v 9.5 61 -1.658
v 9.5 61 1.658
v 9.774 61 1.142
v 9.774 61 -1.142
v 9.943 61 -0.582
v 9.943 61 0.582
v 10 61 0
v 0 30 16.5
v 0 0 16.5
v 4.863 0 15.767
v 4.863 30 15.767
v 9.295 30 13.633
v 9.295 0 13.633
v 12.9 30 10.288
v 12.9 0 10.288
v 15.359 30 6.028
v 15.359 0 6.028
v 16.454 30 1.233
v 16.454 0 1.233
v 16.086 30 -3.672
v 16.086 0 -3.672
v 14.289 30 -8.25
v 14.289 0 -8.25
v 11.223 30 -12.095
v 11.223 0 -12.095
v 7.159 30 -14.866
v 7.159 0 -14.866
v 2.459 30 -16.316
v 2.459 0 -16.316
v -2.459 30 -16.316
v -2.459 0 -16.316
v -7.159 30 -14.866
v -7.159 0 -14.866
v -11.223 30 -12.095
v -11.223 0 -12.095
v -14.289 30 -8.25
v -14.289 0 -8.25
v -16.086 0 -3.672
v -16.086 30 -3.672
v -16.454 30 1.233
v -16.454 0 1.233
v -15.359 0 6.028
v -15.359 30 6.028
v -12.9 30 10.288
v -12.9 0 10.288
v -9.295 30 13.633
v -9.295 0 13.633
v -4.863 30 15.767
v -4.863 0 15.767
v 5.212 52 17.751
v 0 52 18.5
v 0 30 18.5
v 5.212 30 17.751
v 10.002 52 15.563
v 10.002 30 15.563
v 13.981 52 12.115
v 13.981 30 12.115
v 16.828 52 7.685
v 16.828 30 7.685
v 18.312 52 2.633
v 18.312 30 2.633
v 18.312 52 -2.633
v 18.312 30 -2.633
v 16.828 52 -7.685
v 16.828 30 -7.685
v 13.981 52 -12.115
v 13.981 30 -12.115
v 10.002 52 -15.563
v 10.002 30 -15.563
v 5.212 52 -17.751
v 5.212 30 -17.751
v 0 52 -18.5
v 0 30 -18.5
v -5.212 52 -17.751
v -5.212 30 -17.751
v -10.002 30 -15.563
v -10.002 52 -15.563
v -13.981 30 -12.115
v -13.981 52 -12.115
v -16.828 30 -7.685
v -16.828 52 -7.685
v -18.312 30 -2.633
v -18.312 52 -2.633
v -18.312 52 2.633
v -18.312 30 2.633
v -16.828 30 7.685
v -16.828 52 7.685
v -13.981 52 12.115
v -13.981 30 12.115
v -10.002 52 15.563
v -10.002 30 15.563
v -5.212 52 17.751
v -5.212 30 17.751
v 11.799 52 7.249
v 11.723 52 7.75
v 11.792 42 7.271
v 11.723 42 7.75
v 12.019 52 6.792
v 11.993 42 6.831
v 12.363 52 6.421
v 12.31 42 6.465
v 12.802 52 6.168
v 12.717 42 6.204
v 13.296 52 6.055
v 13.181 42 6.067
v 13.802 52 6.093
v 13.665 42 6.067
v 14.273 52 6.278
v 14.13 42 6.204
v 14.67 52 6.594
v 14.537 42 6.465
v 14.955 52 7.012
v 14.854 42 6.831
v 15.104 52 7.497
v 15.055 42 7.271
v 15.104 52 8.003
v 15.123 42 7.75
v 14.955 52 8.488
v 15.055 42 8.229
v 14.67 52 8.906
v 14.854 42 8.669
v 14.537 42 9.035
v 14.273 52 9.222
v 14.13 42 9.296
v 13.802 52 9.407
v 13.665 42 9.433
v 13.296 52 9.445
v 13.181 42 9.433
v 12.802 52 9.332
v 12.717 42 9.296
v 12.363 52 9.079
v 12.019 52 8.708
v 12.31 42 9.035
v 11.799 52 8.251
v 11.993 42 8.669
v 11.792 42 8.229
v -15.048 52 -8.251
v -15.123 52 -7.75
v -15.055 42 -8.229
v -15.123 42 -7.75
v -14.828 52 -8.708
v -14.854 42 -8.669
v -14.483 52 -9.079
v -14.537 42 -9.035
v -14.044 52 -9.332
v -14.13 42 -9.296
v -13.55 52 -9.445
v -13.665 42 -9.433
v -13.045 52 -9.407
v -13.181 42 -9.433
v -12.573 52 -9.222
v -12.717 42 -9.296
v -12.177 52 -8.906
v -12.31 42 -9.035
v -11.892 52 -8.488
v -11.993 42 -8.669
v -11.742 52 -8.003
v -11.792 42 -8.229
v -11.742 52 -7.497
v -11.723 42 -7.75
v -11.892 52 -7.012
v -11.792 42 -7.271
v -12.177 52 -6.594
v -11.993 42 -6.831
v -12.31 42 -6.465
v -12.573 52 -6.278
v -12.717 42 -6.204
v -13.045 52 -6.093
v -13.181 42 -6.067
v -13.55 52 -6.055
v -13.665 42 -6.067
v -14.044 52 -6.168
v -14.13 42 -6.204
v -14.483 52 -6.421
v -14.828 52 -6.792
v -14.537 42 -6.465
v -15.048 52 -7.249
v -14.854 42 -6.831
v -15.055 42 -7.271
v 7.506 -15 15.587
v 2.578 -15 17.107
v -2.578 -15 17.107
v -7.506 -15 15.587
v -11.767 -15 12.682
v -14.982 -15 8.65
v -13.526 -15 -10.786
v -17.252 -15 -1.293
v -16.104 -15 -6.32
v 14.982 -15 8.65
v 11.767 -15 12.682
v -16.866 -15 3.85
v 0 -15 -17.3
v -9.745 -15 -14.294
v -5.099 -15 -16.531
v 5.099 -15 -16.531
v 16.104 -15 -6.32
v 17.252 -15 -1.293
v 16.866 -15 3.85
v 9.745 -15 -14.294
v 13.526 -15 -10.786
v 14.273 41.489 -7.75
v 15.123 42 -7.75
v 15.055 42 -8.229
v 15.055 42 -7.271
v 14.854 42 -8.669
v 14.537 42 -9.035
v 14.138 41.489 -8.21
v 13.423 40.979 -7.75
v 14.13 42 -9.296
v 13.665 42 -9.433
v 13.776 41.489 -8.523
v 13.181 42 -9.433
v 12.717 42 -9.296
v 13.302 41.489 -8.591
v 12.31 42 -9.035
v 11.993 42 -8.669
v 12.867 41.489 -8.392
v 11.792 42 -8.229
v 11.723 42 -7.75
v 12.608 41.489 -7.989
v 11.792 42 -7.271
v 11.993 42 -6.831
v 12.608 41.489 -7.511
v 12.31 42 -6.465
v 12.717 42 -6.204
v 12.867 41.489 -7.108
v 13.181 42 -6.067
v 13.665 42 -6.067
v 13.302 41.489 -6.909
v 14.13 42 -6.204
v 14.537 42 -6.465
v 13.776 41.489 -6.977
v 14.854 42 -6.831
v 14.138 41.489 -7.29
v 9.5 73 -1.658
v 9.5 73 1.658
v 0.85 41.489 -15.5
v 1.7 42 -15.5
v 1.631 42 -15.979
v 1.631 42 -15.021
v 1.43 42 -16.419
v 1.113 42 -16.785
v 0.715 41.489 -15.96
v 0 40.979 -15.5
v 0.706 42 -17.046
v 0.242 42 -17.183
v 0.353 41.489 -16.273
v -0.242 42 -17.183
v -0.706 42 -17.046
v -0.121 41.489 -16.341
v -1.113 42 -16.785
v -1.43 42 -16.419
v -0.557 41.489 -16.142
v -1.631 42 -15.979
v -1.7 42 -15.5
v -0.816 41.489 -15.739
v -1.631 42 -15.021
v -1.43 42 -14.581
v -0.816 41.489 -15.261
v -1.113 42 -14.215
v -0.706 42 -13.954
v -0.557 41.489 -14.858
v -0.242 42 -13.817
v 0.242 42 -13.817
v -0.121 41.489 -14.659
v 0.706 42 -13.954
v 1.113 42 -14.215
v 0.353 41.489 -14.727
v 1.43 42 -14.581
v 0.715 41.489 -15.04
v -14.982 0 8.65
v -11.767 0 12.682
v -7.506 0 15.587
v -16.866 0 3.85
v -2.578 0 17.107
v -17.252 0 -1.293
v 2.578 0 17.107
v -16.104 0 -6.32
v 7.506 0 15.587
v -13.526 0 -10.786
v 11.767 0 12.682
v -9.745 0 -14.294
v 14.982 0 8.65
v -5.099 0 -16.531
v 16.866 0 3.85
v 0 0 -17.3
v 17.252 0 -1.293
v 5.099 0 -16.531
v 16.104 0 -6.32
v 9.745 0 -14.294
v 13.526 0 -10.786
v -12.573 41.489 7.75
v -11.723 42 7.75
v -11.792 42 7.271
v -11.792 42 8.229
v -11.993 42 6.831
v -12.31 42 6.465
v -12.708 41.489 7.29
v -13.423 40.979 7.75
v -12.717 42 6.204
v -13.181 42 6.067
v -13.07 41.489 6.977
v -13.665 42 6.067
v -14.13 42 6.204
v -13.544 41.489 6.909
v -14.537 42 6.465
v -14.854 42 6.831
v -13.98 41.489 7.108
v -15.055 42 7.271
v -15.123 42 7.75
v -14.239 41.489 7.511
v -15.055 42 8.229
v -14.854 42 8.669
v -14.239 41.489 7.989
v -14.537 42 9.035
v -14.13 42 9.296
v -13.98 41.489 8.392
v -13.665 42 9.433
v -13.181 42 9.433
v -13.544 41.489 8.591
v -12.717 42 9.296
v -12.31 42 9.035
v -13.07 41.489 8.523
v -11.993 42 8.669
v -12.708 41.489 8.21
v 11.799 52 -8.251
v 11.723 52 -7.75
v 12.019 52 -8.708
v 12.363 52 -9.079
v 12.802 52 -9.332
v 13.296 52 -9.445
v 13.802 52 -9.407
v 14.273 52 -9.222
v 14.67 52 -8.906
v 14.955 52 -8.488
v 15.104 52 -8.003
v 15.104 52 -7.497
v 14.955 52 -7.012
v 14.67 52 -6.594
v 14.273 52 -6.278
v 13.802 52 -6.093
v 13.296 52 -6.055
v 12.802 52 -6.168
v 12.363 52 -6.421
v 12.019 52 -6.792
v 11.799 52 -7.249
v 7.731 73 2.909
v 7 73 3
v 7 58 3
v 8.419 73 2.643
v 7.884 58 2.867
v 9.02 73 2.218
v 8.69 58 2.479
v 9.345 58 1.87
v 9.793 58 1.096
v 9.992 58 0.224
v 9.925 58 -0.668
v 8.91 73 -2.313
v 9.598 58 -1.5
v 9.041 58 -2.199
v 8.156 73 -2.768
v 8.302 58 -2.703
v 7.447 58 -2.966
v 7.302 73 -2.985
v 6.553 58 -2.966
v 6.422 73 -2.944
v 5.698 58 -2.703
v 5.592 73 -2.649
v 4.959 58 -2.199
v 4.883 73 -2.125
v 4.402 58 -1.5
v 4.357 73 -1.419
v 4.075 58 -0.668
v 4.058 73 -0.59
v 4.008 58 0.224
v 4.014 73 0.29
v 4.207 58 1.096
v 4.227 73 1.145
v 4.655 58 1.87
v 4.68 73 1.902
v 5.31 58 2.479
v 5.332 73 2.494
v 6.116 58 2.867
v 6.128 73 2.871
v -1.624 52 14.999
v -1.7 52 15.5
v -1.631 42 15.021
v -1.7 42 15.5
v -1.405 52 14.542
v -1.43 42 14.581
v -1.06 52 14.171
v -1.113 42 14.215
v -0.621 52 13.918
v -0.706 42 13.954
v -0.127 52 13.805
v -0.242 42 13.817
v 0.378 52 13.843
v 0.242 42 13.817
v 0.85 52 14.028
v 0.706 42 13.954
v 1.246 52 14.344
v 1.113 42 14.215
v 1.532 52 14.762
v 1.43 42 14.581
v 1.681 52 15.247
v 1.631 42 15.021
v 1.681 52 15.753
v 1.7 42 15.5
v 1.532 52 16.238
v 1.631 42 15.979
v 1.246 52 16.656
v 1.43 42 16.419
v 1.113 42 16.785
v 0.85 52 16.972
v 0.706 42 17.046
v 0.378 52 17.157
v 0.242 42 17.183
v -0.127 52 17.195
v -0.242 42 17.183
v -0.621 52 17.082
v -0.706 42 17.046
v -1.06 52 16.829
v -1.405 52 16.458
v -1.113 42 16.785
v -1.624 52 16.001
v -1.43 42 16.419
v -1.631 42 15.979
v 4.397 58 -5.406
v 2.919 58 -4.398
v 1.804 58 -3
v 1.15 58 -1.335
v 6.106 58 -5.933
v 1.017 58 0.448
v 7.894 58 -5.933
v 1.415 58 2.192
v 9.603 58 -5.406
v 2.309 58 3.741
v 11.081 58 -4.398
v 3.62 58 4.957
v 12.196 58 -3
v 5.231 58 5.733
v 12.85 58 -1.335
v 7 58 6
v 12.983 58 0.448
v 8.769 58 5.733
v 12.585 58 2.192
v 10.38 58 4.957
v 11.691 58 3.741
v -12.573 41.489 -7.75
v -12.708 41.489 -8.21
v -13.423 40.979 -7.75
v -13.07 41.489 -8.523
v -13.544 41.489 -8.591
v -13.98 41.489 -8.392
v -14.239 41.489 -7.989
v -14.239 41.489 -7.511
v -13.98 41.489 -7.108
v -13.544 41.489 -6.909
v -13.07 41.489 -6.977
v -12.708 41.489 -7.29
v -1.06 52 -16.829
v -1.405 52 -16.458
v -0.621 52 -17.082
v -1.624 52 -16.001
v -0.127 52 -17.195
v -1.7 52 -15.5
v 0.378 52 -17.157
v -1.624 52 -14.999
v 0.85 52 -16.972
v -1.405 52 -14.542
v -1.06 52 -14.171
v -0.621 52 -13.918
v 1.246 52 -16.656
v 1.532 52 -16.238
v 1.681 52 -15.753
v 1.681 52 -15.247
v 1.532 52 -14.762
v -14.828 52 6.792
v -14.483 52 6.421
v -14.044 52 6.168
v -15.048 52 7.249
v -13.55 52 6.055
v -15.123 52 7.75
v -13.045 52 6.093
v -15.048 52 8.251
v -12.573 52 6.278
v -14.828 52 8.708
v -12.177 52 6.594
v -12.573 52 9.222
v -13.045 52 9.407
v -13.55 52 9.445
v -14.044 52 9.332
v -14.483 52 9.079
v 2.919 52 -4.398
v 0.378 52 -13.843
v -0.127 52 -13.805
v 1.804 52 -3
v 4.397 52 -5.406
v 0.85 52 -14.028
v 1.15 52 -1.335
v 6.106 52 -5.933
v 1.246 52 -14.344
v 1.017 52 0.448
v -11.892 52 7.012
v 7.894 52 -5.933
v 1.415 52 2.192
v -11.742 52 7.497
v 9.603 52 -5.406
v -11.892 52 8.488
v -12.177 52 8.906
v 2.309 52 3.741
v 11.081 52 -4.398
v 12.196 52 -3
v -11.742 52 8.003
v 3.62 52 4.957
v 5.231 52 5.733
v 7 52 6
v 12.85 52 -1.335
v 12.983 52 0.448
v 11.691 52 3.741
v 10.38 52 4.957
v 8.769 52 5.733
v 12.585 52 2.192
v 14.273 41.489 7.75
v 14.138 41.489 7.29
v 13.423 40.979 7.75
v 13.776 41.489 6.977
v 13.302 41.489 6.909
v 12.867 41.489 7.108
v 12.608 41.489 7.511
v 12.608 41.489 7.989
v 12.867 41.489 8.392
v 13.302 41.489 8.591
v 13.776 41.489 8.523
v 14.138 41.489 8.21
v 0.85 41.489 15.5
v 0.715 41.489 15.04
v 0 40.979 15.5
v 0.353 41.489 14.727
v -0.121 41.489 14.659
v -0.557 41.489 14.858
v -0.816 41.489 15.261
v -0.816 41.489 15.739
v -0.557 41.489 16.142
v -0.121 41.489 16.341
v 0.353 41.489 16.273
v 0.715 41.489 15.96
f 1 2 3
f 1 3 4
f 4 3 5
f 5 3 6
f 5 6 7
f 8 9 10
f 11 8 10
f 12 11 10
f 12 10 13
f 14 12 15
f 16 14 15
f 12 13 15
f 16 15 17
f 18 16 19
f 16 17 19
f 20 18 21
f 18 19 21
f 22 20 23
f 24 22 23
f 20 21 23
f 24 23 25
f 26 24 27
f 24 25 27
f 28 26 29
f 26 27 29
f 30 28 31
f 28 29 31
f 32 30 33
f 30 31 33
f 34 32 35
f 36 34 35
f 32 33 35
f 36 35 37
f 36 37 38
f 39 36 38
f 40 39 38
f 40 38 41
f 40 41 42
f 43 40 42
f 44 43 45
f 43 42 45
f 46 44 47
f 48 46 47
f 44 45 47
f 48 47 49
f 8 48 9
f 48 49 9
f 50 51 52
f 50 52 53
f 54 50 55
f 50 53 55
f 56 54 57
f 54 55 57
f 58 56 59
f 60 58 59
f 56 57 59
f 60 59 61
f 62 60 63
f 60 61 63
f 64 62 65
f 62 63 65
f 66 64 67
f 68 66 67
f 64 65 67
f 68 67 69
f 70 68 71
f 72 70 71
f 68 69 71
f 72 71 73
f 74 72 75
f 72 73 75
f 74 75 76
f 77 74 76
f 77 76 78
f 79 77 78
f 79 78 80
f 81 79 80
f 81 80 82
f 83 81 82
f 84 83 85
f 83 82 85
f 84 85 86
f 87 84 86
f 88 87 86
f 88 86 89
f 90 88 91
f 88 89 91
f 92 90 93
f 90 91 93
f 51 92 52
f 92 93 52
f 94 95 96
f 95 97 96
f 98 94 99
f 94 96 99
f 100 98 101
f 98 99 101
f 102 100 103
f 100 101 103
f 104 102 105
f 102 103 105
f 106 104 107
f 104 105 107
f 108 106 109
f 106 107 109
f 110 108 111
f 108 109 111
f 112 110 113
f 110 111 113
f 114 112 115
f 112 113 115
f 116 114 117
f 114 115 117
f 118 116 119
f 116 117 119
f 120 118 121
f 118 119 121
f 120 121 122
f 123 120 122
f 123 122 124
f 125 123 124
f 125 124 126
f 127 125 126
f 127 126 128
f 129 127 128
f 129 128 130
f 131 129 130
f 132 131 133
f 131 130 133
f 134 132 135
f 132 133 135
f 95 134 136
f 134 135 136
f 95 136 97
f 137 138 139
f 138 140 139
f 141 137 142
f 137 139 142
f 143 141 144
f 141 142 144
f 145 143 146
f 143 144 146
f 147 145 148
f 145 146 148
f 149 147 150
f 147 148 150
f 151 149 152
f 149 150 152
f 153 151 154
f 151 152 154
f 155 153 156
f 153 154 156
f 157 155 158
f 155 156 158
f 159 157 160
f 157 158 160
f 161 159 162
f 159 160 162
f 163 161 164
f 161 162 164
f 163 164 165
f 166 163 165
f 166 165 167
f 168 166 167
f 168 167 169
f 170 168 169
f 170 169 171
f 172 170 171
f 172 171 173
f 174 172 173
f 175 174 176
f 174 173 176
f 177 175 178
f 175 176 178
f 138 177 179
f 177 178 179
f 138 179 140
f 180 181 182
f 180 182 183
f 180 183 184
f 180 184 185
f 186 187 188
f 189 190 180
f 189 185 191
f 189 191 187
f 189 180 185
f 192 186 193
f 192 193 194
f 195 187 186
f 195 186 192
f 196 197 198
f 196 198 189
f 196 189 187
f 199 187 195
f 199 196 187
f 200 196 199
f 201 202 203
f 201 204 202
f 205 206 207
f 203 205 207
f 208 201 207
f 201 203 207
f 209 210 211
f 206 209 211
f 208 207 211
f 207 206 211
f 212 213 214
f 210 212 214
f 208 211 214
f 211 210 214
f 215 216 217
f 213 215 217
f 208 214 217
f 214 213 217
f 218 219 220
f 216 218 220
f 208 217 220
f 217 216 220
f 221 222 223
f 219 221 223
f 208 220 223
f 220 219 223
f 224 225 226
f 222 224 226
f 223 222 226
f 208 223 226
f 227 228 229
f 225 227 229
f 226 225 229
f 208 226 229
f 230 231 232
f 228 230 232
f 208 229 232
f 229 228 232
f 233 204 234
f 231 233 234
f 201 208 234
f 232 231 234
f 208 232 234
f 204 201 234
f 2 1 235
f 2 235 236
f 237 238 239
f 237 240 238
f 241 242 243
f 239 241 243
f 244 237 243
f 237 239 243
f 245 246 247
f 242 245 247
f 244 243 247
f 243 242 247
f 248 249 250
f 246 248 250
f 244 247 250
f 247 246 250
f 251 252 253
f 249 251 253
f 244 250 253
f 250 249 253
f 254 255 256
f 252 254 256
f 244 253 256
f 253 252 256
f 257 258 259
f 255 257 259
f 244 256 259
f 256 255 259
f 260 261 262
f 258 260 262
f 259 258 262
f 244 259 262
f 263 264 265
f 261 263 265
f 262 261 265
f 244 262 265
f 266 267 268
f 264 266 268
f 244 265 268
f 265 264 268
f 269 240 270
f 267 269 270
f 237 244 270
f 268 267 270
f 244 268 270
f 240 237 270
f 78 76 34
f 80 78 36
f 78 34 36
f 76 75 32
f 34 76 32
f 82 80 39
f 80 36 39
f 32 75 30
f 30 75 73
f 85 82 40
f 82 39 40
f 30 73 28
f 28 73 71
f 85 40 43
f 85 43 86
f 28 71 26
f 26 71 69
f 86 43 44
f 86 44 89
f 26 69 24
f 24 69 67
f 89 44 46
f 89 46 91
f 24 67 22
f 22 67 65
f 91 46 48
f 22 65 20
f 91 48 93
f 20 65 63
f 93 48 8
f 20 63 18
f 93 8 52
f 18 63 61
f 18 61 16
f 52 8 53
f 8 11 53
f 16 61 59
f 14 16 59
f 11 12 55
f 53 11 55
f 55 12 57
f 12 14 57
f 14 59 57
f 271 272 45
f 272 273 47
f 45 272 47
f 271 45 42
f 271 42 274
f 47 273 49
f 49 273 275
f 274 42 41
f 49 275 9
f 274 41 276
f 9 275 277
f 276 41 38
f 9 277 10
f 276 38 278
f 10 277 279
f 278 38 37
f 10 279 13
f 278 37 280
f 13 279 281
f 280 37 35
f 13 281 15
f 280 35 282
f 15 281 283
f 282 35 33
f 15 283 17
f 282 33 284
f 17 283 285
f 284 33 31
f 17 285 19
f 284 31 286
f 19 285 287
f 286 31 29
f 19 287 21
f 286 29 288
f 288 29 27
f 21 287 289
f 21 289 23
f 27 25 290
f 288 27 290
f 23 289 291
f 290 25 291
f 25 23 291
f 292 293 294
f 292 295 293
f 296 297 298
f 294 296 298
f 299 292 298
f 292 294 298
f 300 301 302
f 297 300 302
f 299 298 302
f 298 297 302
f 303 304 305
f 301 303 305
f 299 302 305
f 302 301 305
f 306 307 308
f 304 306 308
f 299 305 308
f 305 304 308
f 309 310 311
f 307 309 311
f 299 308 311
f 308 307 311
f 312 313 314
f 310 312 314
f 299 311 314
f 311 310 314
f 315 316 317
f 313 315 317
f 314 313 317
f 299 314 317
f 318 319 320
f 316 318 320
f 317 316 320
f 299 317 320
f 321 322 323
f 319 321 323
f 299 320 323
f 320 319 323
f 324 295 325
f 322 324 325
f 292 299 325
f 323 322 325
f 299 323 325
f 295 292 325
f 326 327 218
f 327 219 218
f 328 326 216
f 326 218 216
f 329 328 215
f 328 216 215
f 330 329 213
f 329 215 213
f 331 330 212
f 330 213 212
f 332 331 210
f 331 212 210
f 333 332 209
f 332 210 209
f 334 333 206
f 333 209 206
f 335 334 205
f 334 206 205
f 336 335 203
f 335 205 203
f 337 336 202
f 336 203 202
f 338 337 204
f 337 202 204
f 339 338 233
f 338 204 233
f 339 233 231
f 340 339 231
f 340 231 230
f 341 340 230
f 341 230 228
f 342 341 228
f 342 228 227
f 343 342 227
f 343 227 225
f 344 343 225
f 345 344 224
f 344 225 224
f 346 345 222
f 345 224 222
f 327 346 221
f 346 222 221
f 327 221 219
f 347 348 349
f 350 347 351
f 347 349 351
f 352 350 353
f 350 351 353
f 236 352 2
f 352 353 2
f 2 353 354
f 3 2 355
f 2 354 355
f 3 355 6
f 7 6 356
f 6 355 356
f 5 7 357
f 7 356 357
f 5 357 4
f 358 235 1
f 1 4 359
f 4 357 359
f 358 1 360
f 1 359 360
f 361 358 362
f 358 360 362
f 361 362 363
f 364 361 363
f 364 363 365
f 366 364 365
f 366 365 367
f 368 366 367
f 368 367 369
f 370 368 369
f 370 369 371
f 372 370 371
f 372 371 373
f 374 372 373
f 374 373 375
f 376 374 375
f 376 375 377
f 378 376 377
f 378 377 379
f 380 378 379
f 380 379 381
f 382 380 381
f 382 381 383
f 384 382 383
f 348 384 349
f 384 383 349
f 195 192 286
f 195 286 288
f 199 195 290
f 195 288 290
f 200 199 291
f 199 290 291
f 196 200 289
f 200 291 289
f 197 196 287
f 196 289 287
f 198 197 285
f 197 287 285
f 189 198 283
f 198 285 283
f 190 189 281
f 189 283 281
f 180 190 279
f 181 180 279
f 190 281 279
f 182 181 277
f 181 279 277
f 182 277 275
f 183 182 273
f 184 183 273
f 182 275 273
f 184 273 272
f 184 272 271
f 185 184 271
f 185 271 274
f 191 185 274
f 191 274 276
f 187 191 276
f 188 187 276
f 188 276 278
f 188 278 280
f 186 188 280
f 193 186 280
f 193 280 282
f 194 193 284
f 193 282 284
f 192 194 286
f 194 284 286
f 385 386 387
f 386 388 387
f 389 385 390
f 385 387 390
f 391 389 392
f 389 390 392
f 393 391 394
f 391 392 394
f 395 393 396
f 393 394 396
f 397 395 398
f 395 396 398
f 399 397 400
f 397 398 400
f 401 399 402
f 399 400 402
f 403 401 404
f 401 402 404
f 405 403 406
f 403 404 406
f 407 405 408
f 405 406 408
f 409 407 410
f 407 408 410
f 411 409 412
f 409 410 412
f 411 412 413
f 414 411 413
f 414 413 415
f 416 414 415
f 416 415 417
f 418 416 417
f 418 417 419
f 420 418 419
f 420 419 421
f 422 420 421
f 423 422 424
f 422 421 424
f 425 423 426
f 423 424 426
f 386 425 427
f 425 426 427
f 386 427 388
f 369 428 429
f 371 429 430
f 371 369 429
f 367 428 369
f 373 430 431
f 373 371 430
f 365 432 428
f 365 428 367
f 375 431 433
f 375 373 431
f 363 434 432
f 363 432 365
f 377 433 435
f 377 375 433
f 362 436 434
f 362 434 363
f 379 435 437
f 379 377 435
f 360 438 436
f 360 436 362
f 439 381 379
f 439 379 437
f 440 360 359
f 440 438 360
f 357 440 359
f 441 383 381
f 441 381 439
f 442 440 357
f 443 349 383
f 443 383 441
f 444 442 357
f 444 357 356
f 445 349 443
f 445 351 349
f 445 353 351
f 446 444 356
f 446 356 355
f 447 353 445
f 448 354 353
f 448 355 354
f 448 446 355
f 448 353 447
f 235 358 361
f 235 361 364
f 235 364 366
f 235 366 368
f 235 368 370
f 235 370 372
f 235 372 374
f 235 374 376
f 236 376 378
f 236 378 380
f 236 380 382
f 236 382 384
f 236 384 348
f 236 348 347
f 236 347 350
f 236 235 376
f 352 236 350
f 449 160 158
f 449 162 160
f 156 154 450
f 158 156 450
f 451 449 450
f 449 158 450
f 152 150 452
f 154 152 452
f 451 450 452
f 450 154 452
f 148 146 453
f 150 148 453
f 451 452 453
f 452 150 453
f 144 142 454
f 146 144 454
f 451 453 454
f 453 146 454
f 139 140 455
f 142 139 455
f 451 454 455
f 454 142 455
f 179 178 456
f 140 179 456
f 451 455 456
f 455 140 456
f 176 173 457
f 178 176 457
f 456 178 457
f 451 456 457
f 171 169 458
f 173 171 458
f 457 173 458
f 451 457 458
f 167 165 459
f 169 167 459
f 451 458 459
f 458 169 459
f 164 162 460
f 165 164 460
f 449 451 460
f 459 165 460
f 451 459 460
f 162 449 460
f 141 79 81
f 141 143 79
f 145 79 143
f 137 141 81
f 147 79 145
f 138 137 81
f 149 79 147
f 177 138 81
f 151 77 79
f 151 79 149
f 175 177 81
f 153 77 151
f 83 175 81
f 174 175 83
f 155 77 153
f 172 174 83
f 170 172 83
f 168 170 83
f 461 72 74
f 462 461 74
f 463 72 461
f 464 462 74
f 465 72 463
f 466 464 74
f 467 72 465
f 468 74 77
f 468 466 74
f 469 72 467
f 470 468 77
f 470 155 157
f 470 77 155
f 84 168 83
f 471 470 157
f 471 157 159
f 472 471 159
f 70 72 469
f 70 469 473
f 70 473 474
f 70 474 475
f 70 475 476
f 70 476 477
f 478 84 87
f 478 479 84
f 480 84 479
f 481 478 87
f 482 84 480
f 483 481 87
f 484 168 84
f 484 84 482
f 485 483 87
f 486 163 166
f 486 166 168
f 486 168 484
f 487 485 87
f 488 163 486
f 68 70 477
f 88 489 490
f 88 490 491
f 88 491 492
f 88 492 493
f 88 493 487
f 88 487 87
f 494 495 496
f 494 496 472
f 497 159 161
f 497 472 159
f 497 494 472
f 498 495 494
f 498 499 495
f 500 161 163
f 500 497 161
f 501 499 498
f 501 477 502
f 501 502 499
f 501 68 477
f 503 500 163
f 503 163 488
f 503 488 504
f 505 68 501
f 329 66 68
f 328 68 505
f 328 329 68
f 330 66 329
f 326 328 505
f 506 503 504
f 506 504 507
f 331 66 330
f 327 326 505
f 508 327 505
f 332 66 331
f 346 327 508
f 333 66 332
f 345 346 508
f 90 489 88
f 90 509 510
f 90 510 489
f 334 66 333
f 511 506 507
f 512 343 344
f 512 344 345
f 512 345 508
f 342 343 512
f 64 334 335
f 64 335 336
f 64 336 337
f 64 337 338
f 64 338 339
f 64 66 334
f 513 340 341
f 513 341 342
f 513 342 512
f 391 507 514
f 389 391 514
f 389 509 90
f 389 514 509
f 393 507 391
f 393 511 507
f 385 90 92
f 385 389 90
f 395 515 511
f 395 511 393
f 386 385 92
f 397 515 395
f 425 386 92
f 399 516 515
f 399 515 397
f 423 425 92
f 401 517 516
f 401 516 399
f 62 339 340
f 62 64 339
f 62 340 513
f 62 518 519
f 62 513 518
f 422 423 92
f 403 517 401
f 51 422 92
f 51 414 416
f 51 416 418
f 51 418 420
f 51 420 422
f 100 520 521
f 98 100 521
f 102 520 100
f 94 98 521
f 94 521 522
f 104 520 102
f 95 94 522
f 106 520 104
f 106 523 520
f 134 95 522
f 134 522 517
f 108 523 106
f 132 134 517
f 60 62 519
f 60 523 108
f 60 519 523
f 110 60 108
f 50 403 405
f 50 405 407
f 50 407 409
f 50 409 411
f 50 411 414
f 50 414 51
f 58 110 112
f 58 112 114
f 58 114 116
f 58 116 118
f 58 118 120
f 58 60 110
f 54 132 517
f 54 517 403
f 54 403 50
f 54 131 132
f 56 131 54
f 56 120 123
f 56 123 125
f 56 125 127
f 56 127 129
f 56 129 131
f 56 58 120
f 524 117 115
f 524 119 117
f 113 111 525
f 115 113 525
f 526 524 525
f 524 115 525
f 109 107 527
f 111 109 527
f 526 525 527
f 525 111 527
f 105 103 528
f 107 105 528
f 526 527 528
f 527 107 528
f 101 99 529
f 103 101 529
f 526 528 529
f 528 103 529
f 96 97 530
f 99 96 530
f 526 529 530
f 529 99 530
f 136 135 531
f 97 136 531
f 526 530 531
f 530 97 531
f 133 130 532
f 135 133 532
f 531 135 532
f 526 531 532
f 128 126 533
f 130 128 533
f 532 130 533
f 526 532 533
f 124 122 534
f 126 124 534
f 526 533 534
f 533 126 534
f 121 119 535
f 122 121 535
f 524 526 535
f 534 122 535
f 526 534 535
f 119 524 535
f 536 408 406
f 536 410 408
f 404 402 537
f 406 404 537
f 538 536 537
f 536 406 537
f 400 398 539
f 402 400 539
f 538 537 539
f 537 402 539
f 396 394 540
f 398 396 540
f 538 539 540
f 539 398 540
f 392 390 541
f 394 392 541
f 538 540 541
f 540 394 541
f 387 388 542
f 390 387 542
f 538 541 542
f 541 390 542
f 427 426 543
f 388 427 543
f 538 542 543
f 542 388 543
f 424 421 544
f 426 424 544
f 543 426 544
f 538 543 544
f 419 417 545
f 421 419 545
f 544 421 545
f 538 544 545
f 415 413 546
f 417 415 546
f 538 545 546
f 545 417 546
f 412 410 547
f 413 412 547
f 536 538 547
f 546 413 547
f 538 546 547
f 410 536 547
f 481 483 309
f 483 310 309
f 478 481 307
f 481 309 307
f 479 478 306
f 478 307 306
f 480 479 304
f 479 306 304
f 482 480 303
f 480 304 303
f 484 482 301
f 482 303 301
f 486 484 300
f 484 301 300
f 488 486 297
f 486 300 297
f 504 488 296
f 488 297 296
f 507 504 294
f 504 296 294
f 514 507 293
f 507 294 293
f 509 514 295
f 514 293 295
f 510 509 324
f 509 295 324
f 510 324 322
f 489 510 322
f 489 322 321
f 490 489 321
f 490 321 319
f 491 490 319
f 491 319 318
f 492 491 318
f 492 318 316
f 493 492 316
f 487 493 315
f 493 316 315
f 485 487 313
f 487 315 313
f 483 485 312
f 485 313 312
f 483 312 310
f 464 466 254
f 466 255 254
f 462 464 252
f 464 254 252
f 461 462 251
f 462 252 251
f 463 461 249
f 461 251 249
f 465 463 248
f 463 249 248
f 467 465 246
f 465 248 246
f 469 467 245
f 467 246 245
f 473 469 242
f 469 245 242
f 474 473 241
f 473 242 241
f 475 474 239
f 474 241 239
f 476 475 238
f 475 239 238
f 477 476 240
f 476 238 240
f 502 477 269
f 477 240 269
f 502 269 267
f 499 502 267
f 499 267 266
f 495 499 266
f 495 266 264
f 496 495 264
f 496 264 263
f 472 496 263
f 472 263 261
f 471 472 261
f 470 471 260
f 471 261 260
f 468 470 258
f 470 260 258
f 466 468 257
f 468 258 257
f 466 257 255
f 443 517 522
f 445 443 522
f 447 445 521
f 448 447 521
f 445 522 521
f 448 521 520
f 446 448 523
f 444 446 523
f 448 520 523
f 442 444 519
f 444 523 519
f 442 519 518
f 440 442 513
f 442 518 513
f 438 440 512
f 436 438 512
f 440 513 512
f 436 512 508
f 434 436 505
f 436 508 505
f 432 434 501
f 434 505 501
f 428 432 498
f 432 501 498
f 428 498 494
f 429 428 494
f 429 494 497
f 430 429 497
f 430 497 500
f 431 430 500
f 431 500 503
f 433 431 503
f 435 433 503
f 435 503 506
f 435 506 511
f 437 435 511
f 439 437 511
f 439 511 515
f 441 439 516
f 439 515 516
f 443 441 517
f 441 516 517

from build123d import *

# Parameters (mm, degrees)
SKETCH1_R                = 16.5
BOSS_EXTRUDE1_DEPTH      = 30
SKETCH2_R                = 2
BOSS_EXTRUDE2_DEPTH      = 2
SKETCH3_R                = 18.5
BOSS_EXTRUDE3_DEPTH      = 22
SKETCH5_R                = 6
BOSS_EXTRUDE4_DEPTH      = 6
SKETCH6_R                = 3
BOSS_EXTRUDE5_DEPTH      = 15
CUT_EXTRUDE1_START       = -12
CUT_EXTRUDE1_DEPTH       = 12
M3_CLEARANCE_HOLE1_D     = 3.4
M3_CLEARANCE_HOLE1_DEPTH = 10
M3_CLEARANCE_HOLE1_TIP   = 1.021463052
SKETCH16_R               = 17.3
BOSS_EXTRUDE6_DEPTH      = 15


with BuildPart() as part:
    # Sketch1 → Boss-Extrude1 (new body)
    with BuildSketch(Plane(origin=(0, 0, 0), x_dir=(1, 0, 0), z_dir=(0, 1, 0))):
        with Locations(Location((0, 0, 0), (0, 0, 270))):
            Circle(SKETCH1_R)
    extrude(amount=BOSS_EXTRUDE1_DEPTH)

    # Sketch2 → Boss-Extrude2 (add)
    with BuildSketch(Plane.XZ):
        with Locations(Location((0, 0, 0), (0, 0, 90))):
            Circle(SKETCH2_R)
    extrude(amount=BOSS_EXTRUDE2_DEPTH)

    # Sketch3 → Boss-Extrude3 (add)
    with BuildSketch(Plane(origin=(0, 30, 0), x_dir=(1, 0, 0), z_dir=(0, 1, 0))):
        with Locations(Location((0, 0, 0), (0, 0, 270))):
            Circle(SKETCH3_R)
    extrude(amount=BOSS_EXTRUDE3_DEPTH)

    # Sketch5 → Boss-Extrude4 (add)
    with BuildSketch(Plane(origin=(0, 52, 0), x_dir=(1, 0, 0), z_dir=(0, 1, 0))):
        with Locations(Location((7, 0, 0), (0, 0, 270))):
            Circle(SKETCH5_R)
    extrude(amount=BOSS_EXTRUDE4_DEPTH)

    # Sketch6 → Boss-Extrude5 (add)
    with BuildSketch(Plane(origin=(0, 58, 0), x_dir=(1, 0, 0), z_dir=(0, 1, 0))):
        with Locations(Location((7, 0, 0), (0, 0, 270))):
            Circle(SKETCH6_R)
    extrude(amount=BOSS_EXTRUDE5_DEPTH)

    # Sketch9 → Cut-Extrude1 (cut)
    with BuildSketch(Plane(origin=(0, 73, 0), x_dir=(1, 0, 0), z_dir=(0, 1, 0)).offset(CUT_EXTRUDE1_START)):
        with BuildLine():
            ThreePointArc((9.5, -1.658312395), (9.872281323, -0.866025404), (10, 0))
            Line((10, 0), (9.5, 0))
            Line((9.5, 0), (9.5, -1.658312395))
        make_face()
        with BuildLine():
            Line((9.5, 0), (10, 0))
            ThreePointArc((10, 0), (9.872281323, 0.866025404), (9.5, 1.658312395))
            Line((9.5, 1.658312395), (9.5, 0))
        make_face()
    extrude(amount=CUT_EXTRUDE1_DEPTH, mode=Mode.SUBTRACT)

    # M3 Clearance Hole1
    with Locations(Plane(origin=(0, 52, 0), x_dir=(1, 0, 0), z_dir=(0, 1, 0))):
        with Locations((0, -15.5), (-13.423393759, -7.75), (0, 15.5), (-13.423393759, 7.75), (13.423393759, -7.75), (13.423393759, 7.75)):
            Hole(M3_CLEARANCE_HOLE1_D / 2, depth=M3_CLEARANCE_HOLE1_DEPTH)
            with Locations((0, 0, -(M3_CLEARANCE_HOLE1_DEPTH + M3_CLEARANCE_HOLE1_TIP / 2))):  # 118° drill point
                Cone(0, M3_CLEARANCE_HOLE1_D / 2, M3_CLEARANCE_HOLE1_TIP, mode=Mode.SUBTRACT)

    # Sketch16 → Boss-Extrude6 (add)
    with BuildSketch(Plane.XZ):
        with Locations(Location((0, 0, 0), (0, 0, 270))):
            Circle(SKETCH16_R)
    extrude(amount=BOSS_EXTRUDE6_DEPTH)


solid = part.part
